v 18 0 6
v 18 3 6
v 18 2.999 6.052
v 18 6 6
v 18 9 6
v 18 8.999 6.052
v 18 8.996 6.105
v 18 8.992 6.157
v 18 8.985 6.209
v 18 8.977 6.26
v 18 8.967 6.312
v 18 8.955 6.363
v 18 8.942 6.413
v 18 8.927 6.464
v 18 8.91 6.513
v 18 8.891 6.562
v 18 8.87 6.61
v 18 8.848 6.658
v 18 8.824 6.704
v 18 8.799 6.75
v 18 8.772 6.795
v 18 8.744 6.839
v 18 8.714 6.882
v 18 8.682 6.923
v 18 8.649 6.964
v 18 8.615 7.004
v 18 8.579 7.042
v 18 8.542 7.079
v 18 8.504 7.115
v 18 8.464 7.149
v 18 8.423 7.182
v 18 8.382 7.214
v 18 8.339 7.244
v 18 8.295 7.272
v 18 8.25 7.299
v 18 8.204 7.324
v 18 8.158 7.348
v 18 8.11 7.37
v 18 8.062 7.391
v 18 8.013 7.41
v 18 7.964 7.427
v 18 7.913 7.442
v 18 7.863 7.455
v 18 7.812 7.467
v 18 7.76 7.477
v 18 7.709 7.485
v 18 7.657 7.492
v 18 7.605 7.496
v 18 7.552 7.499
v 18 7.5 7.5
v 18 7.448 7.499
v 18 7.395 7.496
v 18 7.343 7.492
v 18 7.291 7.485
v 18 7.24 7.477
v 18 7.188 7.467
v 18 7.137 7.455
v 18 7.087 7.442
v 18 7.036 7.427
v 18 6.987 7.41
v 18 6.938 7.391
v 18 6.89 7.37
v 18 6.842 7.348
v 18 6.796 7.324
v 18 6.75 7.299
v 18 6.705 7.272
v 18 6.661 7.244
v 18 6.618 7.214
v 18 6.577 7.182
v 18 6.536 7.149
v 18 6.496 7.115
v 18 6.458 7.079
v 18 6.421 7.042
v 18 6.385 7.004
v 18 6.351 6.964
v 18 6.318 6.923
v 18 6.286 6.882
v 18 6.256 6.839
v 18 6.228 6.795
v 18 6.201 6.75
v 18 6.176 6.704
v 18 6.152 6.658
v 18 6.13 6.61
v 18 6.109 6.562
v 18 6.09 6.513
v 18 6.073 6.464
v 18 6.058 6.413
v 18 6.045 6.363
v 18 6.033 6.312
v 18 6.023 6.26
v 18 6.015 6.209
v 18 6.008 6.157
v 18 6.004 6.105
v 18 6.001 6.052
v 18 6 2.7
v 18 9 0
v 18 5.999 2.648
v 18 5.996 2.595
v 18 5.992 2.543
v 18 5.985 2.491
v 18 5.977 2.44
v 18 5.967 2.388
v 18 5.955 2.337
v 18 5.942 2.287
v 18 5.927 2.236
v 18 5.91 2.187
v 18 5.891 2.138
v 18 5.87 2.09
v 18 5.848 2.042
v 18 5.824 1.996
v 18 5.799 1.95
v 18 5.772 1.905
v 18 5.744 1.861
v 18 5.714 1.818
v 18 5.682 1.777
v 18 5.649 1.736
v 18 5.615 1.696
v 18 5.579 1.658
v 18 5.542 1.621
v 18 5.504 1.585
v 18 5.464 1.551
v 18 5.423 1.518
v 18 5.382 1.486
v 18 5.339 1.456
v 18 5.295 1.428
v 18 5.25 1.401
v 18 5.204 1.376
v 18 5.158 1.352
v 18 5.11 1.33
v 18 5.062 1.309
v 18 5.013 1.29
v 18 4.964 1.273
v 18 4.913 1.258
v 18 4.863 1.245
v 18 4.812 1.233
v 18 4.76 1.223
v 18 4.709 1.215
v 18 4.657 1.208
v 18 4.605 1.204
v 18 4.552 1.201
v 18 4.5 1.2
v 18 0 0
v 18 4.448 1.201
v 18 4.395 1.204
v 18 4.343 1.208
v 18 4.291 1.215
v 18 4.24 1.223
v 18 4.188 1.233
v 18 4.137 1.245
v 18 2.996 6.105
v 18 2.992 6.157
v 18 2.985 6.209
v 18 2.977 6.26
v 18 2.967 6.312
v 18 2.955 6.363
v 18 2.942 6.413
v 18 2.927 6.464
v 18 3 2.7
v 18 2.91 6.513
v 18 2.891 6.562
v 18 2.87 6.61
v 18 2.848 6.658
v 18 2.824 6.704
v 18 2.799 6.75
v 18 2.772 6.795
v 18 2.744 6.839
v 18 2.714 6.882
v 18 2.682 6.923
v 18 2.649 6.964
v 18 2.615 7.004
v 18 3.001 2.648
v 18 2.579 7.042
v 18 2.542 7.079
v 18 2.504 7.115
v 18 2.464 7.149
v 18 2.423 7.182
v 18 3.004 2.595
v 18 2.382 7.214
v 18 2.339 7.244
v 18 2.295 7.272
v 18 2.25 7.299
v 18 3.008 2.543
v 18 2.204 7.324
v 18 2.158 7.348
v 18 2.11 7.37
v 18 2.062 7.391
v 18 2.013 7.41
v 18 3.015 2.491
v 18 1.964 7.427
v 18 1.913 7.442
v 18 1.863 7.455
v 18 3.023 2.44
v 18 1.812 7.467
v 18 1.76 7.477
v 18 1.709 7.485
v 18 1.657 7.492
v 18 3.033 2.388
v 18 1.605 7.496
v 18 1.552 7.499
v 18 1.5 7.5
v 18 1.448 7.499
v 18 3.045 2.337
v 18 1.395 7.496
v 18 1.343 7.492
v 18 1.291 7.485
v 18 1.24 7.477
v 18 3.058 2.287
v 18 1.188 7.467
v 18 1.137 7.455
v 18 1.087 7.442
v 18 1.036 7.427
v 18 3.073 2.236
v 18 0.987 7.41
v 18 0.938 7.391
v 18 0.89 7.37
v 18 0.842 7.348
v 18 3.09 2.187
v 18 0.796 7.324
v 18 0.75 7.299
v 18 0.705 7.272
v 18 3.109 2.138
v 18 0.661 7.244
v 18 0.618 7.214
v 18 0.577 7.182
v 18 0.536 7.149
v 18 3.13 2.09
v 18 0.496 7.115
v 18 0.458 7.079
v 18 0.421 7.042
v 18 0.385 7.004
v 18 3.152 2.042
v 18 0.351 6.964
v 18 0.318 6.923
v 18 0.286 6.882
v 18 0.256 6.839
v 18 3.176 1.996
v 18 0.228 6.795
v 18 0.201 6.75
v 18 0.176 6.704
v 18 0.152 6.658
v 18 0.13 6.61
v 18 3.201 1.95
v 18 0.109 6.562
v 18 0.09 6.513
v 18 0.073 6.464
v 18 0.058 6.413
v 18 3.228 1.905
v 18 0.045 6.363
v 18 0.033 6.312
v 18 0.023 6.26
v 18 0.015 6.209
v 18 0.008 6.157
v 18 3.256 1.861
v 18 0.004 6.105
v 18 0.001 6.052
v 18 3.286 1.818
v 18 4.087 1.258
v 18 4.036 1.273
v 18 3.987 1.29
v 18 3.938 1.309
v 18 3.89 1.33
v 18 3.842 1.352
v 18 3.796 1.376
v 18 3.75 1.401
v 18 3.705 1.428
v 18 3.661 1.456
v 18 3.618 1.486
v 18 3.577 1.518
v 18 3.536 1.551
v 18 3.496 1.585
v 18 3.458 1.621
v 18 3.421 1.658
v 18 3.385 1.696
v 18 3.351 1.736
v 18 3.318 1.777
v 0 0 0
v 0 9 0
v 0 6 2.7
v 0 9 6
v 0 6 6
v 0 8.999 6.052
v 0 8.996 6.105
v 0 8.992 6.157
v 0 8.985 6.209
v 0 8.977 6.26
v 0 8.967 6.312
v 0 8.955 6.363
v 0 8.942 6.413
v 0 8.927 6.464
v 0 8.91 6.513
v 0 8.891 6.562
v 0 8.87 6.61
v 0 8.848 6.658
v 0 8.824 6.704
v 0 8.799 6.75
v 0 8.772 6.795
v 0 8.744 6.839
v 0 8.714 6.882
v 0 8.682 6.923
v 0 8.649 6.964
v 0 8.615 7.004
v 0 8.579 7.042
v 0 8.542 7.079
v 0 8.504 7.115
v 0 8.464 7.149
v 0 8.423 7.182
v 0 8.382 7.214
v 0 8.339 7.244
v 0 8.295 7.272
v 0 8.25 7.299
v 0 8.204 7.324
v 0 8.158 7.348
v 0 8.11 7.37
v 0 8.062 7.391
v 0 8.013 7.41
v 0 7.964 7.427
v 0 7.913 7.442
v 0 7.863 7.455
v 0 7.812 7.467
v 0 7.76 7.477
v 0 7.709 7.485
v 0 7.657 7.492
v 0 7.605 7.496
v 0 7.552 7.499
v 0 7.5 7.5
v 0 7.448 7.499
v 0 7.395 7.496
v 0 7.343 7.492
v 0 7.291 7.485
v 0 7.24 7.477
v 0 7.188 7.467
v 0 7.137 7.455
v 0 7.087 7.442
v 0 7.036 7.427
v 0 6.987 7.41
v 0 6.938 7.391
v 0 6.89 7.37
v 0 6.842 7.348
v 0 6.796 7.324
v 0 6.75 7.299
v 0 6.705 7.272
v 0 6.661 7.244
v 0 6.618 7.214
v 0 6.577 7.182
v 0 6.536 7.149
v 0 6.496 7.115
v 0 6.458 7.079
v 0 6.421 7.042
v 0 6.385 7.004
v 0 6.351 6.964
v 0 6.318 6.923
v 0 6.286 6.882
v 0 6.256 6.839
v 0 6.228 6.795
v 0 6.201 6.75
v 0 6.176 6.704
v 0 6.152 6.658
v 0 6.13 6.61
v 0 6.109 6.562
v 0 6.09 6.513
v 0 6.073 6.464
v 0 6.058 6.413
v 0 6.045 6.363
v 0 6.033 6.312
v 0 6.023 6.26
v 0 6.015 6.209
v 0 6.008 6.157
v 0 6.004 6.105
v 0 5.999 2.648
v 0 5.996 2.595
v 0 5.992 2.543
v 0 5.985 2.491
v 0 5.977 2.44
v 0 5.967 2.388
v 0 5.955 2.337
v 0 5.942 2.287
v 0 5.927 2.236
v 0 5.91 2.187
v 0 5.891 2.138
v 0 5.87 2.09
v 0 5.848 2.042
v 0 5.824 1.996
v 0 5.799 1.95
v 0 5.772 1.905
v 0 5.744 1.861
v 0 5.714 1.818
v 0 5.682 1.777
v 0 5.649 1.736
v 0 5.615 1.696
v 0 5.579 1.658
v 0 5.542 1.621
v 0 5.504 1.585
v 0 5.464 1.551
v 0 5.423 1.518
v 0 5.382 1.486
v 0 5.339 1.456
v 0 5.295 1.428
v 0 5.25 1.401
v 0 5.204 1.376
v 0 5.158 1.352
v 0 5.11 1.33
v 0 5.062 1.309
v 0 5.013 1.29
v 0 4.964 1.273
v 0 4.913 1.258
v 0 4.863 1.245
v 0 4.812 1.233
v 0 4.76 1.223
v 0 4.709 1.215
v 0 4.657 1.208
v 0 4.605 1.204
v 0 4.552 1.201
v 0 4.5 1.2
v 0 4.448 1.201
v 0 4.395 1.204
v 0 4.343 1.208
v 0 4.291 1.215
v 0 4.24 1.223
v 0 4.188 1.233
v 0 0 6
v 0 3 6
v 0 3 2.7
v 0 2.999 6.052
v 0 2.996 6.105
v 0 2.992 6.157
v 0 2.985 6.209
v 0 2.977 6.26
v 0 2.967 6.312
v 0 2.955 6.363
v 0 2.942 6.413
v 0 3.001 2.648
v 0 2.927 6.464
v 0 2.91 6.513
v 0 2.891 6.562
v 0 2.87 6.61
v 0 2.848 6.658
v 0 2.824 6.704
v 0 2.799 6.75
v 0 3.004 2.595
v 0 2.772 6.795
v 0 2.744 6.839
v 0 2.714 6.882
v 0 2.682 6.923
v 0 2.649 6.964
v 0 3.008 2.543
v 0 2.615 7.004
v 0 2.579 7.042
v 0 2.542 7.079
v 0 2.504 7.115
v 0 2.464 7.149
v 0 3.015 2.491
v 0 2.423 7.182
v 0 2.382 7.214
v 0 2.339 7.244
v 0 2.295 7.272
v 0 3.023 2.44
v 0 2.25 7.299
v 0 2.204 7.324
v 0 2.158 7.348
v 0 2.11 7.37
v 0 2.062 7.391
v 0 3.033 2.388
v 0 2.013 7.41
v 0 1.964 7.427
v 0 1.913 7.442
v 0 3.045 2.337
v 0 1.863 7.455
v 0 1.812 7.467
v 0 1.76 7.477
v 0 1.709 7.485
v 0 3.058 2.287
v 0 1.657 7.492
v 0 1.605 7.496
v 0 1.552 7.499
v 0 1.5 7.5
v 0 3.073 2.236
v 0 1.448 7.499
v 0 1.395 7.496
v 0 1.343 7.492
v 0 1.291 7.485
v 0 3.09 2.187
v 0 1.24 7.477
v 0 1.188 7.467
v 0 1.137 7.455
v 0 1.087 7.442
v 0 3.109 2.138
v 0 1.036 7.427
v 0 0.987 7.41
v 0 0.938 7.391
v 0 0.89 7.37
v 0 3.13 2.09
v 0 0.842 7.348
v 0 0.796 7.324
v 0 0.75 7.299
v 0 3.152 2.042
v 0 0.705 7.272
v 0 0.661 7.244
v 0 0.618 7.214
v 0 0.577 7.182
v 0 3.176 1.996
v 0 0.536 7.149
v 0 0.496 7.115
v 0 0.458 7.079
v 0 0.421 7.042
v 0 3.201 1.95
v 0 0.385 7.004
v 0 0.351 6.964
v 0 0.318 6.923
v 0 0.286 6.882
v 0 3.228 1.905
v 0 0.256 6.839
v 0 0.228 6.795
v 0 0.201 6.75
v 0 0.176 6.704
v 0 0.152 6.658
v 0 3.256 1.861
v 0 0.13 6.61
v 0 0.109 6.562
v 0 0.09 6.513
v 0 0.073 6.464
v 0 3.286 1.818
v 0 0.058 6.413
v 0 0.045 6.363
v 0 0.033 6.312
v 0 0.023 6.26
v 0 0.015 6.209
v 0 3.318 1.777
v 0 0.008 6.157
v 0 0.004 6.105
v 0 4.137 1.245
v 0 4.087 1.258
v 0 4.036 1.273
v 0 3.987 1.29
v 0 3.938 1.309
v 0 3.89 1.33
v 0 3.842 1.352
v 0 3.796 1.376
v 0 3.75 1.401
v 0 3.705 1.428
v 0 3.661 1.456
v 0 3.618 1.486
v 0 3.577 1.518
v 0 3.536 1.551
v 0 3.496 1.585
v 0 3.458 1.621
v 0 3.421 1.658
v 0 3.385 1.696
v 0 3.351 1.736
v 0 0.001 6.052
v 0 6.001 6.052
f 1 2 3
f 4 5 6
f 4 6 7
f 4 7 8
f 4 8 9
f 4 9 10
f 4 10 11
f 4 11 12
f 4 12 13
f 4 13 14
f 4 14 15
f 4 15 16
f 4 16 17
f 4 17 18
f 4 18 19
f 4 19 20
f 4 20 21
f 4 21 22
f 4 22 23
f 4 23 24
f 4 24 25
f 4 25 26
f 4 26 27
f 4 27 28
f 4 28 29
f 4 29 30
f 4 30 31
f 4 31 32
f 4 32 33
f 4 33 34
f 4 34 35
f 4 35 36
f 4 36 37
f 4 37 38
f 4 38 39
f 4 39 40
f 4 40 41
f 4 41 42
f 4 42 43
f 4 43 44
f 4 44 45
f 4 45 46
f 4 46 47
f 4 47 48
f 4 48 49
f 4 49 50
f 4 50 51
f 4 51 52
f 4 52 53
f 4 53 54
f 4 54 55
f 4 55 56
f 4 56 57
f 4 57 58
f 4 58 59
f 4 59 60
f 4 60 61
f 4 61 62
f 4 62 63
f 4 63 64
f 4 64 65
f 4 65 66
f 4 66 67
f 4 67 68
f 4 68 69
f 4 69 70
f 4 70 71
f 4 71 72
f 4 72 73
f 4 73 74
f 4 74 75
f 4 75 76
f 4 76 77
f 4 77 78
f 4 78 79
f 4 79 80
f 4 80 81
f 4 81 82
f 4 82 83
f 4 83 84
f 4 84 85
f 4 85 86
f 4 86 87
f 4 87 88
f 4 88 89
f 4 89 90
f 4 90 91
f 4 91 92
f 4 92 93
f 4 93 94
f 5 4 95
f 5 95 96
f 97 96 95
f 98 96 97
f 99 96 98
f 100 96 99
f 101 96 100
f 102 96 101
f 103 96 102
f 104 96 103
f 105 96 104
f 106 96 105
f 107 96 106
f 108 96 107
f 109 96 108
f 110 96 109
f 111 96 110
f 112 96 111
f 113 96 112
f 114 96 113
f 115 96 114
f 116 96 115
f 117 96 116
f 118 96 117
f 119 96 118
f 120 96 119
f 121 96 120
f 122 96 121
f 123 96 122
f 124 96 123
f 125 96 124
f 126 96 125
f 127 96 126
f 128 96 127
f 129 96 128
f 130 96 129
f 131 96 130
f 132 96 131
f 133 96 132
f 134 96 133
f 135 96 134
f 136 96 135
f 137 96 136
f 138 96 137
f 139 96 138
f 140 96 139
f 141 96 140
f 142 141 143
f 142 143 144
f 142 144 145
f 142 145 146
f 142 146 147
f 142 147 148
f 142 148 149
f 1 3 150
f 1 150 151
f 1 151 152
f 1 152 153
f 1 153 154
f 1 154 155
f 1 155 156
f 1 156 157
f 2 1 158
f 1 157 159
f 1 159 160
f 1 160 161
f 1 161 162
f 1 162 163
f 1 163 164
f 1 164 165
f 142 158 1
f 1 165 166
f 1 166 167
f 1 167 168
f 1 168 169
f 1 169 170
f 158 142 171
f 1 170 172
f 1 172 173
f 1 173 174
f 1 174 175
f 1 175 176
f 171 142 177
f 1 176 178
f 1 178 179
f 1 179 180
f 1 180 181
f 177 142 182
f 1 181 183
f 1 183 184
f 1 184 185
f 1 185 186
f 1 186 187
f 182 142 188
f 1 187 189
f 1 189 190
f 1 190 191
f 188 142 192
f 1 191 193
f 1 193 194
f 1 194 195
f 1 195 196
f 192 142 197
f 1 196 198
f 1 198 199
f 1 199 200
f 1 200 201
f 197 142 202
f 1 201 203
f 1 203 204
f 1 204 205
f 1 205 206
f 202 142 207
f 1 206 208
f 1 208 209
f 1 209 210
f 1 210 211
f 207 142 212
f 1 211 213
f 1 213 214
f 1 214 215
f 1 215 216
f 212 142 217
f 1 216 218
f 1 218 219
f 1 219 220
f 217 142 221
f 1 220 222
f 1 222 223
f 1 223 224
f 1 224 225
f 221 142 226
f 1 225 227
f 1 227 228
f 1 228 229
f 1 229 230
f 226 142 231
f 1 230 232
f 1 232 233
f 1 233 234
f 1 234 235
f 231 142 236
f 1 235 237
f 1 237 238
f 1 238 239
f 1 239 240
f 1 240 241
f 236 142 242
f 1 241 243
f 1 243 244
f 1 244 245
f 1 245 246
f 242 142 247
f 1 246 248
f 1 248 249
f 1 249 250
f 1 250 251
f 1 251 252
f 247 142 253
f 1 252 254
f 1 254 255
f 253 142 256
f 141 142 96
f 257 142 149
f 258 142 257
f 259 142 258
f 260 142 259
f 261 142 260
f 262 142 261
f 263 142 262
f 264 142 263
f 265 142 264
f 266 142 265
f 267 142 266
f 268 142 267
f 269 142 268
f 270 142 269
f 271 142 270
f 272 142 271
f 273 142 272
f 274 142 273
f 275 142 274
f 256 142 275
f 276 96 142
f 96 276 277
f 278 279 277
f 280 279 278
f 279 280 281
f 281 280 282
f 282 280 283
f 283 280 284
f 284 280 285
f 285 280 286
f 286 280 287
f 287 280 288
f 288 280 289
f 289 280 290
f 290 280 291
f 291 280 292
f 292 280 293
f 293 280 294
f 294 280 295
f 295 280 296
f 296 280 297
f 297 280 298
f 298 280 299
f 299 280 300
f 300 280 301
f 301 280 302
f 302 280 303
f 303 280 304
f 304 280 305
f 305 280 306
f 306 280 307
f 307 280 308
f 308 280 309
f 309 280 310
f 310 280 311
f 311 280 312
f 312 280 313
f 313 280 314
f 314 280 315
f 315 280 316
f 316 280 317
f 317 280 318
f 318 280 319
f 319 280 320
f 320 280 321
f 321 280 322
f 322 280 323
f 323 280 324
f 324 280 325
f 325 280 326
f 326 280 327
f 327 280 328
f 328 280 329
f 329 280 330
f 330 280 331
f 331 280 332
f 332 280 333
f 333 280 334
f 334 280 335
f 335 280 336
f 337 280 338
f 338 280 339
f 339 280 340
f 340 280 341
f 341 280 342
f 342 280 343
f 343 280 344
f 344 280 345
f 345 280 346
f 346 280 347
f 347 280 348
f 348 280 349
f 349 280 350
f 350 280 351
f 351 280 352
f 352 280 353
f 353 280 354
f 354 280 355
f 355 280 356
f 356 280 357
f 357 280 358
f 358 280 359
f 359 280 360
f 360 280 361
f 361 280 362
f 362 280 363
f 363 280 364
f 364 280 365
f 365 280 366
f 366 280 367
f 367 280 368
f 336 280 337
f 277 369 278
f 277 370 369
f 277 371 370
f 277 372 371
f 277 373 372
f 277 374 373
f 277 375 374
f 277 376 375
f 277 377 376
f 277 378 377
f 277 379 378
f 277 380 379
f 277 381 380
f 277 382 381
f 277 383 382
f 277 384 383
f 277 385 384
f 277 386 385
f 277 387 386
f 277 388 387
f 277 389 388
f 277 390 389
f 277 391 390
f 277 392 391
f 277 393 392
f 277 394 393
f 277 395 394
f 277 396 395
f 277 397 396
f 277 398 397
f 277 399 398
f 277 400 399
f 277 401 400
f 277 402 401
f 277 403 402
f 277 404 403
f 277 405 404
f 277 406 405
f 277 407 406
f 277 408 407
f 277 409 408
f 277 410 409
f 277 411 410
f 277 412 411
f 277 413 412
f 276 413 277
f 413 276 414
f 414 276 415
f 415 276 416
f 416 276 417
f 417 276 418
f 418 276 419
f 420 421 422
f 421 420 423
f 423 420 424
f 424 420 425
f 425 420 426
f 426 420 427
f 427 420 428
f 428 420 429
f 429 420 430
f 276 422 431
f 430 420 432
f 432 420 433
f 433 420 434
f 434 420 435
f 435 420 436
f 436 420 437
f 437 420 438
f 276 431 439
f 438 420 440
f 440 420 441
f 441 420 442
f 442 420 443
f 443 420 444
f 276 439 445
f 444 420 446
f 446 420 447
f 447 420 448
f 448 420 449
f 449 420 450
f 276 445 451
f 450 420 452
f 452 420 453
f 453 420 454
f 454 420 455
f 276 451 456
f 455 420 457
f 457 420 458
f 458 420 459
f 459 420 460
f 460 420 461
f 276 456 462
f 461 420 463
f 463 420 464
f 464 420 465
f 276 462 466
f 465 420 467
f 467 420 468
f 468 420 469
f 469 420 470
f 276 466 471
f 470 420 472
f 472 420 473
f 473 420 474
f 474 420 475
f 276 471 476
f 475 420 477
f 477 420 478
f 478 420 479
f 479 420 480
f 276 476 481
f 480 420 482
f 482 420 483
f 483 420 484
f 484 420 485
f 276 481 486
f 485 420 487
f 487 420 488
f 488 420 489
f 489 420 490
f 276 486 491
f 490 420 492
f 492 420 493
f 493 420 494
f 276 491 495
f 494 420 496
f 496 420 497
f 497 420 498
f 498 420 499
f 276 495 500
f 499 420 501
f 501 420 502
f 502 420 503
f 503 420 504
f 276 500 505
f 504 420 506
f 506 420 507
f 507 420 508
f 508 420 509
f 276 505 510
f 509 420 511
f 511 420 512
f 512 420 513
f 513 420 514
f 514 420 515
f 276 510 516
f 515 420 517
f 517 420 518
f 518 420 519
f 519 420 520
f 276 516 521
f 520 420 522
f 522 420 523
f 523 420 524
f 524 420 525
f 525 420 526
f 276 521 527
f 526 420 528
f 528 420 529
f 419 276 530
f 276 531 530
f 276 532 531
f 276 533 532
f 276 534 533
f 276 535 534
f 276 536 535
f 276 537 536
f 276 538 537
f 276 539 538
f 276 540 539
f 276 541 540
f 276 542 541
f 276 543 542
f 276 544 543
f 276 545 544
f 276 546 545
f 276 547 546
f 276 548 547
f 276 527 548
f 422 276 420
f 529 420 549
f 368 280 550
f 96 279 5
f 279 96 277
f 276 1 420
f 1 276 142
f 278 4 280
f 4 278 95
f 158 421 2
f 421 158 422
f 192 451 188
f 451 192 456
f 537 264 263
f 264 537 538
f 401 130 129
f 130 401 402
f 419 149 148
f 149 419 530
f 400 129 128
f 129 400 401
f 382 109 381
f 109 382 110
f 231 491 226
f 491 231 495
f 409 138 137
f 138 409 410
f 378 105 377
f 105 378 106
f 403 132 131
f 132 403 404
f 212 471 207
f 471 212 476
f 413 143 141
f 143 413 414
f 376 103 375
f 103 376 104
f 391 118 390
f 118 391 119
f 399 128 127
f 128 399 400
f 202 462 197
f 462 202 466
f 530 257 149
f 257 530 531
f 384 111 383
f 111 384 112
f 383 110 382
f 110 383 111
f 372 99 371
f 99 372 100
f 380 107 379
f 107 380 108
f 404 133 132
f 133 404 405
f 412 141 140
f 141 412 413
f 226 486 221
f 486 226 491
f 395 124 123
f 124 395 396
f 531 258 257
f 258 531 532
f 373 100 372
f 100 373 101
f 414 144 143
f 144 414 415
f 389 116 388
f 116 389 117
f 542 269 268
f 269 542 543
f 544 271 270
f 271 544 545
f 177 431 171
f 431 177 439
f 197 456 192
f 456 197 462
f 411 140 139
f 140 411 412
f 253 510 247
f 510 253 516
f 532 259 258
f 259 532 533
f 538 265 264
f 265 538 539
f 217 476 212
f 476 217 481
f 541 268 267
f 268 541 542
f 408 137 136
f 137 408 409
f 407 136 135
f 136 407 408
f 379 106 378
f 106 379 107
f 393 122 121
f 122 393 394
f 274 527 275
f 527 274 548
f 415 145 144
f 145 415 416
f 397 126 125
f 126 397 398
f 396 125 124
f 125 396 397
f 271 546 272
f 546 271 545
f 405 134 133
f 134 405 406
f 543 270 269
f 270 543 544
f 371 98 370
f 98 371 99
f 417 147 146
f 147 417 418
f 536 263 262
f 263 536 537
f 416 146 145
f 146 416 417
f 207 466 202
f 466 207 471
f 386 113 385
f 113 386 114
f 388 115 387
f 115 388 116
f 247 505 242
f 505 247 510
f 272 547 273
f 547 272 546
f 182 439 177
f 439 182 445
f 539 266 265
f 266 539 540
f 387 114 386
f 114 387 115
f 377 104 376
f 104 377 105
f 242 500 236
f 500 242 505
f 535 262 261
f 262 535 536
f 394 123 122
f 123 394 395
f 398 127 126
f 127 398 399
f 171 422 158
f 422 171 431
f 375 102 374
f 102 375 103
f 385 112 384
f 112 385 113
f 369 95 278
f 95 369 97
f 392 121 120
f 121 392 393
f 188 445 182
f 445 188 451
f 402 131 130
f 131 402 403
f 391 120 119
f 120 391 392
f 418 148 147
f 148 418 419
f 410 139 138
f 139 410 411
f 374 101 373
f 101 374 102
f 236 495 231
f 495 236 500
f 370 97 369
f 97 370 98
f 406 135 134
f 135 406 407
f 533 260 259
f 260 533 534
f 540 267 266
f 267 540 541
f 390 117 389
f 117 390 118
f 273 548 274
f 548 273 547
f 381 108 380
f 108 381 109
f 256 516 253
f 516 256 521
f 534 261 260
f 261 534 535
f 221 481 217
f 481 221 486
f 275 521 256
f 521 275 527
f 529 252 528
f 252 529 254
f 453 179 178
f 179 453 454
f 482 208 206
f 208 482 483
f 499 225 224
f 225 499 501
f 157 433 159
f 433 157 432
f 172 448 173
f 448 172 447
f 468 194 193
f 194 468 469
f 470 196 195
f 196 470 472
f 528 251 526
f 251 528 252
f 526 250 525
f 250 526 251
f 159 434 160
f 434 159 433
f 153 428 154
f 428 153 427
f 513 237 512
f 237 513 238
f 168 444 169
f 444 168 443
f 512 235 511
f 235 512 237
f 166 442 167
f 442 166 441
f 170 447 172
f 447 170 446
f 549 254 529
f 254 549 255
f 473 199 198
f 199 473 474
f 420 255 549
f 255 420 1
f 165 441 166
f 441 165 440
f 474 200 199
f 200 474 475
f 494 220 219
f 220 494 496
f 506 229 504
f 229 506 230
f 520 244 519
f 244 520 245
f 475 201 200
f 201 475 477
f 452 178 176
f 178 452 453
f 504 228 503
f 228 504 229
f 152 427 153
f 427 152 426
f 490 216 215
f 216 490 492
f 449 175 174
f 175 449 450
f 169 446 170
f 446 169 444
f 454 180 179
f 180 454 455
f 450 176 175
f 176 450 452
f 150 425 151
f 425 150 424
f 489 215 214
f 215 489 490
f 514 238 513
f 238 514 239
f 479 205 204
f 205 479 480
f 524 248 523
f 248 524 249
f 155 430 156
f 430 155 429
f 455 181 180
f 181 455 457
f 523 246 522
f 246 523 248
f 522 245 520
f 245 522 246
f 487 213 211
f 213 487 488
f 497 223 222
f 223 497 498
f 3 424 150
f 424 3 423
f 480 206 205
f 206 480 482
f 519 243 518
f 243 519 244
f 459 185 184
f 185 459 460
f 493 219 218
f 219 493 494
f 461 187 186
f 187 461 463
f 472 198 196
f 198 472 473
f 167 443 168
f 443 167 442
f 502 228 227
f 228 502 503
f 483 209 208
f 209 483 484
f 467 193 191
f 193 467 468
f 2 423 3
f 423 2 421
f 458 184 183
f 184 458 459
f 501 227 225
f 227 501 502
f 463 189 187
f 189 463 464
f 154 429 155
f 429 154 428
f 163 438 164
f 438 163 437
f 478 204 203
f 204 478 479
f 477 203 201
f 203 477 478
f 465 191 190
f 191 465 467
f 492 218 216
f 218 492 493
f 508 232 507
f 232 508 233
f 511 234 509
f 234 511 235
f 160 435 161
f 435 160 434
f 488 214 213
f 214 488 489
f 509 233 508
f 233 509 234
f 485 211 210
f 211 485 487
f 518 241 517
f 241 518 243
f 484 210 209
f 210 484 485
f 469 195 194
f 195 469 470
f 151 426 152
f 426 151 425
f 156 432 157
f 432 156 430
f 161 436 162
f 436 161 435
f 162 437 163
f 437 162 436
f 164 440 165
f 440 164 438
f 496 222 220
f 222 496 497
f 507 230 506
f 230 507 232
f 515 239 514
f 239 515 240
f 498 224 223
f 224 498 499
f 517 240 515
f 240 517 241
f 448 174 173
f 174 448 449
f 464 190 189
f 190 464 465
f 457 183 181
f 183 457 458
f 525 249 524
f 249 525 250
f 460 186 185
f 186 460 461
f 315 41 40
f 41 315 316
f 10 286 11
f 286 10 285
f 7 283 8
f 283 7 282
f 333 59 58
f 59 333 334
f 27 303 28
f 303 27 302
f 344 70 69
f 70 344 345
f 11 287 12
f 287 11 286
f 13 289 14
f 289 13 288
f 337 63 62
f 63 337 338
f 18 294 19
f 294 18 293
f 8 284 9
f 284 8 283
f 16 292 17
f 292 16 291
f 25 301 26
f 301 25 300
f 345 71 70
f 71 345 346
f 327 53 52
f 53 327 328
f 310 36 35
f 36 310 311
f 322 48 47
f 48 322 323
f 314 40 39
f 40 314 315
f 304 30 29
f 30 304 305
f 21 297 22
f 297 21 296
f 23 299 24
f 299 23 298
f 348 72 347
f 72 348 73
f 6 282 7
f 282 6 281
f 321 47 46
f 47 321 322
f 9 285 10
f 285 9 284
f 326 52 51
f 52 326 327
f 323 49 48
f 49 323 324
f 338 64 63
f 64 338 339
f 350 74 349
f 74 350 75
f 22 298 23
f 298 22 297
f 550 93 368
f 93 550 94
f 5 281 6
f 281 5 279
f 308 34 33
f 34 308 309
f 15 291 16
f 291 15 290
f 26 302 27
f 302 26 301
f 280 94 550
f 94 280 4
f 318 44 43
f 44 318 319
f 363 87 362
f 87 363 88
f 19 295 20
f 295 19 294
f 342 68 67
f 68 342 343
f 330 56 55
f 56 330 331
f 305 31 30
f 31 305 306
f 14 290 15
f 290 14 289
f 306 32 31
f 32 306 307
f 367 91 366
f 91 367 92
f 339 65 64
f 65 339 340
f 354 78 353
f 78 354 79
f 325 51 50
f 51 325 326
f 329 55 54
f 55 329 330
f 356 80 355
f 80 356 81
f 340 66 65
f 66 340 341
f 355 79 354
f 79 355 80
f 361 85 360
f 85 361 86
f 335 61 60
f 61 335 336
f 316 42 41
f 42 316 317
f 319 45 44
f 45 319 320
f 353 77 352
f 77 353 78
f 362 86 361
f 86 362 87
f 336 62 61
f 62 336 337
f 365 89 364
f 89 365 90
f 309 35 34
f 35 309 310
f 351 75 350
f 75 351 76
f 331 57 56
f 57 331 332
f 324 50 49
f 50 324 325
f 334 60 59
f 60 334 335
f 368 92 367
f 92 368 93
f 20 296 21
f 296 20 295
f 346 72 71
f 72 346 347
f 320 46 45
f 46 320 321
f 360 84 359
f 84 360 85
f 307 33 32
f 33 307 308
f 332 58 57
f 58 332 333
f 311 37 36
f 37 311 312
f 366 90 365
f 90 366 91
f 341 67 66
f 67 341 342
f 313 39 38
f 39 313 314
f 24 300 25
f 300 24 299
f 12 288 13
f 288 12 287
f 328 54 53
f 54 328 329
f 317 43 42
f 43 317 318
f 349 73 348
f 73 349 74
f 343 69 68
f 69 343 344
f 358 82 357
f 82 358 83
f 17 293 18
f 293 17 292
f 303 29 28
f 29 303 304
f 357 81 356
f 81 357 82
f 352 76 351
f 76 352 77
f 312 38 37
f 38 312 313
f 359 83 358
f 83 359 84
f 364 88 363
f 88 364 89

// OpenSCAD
/*
i seem to be having problems with leveling the CR-10.
In looking or a simple way to reduce the z-stop by a few mm.
i decided to make a clip to fit over the aluminum brace; just
to triggeer the sensor a little sooner.

3/1/2020
This seems to work well.
printed with layer height of 0.2
*/


al_Thickness = 3;
clipWidth = 18;
clipOffest = 1.2;

clipX = clipWidth;
clipY = al_Thickness * 3;
clipZ = al_Thickness * 2;

dx = clipX; dy = al_Thickness; dz = clipOffest;
$fn=180;
Build();

module Build()
{
    union()
    {
        difference()
        {
    
            Block(clipX, clipY, clipZ);
            //remove
            tx = 0; 
            ty = (clipY-dy) / 2; 
            tz = dz + al_Thickness / 2;

            Block(dx, dy, (2 * clipZ), tx, ty, tz);

            translate([tx, (clipY) / 2, tz ])
            {
                chamfer(clipX, al_Thickness);          
            }
        }
        //round wall tops
        translate([0, al_Thickness/2, clipZ])
        chamfer(clipX, al_Thickness);  

        translate([0, clipY - al_Thickness/2, clipZ])
        chamfer(clipX, al_Thickness);
    }
}

module Block(xSide, ySide, zSide, xloc=0, yloc=0, zloc=0)
{
    translate([xloc, yloc, zloc])
    {    
        cube(size=[xSide, ySide, zSide]);    
    }
}

module chamfer(height, diameter)
{
    rotate([0, 90, 0]) 
    {
        cylinder(h = height, d1 = diameter, d2 = diameter);              
    }
}
